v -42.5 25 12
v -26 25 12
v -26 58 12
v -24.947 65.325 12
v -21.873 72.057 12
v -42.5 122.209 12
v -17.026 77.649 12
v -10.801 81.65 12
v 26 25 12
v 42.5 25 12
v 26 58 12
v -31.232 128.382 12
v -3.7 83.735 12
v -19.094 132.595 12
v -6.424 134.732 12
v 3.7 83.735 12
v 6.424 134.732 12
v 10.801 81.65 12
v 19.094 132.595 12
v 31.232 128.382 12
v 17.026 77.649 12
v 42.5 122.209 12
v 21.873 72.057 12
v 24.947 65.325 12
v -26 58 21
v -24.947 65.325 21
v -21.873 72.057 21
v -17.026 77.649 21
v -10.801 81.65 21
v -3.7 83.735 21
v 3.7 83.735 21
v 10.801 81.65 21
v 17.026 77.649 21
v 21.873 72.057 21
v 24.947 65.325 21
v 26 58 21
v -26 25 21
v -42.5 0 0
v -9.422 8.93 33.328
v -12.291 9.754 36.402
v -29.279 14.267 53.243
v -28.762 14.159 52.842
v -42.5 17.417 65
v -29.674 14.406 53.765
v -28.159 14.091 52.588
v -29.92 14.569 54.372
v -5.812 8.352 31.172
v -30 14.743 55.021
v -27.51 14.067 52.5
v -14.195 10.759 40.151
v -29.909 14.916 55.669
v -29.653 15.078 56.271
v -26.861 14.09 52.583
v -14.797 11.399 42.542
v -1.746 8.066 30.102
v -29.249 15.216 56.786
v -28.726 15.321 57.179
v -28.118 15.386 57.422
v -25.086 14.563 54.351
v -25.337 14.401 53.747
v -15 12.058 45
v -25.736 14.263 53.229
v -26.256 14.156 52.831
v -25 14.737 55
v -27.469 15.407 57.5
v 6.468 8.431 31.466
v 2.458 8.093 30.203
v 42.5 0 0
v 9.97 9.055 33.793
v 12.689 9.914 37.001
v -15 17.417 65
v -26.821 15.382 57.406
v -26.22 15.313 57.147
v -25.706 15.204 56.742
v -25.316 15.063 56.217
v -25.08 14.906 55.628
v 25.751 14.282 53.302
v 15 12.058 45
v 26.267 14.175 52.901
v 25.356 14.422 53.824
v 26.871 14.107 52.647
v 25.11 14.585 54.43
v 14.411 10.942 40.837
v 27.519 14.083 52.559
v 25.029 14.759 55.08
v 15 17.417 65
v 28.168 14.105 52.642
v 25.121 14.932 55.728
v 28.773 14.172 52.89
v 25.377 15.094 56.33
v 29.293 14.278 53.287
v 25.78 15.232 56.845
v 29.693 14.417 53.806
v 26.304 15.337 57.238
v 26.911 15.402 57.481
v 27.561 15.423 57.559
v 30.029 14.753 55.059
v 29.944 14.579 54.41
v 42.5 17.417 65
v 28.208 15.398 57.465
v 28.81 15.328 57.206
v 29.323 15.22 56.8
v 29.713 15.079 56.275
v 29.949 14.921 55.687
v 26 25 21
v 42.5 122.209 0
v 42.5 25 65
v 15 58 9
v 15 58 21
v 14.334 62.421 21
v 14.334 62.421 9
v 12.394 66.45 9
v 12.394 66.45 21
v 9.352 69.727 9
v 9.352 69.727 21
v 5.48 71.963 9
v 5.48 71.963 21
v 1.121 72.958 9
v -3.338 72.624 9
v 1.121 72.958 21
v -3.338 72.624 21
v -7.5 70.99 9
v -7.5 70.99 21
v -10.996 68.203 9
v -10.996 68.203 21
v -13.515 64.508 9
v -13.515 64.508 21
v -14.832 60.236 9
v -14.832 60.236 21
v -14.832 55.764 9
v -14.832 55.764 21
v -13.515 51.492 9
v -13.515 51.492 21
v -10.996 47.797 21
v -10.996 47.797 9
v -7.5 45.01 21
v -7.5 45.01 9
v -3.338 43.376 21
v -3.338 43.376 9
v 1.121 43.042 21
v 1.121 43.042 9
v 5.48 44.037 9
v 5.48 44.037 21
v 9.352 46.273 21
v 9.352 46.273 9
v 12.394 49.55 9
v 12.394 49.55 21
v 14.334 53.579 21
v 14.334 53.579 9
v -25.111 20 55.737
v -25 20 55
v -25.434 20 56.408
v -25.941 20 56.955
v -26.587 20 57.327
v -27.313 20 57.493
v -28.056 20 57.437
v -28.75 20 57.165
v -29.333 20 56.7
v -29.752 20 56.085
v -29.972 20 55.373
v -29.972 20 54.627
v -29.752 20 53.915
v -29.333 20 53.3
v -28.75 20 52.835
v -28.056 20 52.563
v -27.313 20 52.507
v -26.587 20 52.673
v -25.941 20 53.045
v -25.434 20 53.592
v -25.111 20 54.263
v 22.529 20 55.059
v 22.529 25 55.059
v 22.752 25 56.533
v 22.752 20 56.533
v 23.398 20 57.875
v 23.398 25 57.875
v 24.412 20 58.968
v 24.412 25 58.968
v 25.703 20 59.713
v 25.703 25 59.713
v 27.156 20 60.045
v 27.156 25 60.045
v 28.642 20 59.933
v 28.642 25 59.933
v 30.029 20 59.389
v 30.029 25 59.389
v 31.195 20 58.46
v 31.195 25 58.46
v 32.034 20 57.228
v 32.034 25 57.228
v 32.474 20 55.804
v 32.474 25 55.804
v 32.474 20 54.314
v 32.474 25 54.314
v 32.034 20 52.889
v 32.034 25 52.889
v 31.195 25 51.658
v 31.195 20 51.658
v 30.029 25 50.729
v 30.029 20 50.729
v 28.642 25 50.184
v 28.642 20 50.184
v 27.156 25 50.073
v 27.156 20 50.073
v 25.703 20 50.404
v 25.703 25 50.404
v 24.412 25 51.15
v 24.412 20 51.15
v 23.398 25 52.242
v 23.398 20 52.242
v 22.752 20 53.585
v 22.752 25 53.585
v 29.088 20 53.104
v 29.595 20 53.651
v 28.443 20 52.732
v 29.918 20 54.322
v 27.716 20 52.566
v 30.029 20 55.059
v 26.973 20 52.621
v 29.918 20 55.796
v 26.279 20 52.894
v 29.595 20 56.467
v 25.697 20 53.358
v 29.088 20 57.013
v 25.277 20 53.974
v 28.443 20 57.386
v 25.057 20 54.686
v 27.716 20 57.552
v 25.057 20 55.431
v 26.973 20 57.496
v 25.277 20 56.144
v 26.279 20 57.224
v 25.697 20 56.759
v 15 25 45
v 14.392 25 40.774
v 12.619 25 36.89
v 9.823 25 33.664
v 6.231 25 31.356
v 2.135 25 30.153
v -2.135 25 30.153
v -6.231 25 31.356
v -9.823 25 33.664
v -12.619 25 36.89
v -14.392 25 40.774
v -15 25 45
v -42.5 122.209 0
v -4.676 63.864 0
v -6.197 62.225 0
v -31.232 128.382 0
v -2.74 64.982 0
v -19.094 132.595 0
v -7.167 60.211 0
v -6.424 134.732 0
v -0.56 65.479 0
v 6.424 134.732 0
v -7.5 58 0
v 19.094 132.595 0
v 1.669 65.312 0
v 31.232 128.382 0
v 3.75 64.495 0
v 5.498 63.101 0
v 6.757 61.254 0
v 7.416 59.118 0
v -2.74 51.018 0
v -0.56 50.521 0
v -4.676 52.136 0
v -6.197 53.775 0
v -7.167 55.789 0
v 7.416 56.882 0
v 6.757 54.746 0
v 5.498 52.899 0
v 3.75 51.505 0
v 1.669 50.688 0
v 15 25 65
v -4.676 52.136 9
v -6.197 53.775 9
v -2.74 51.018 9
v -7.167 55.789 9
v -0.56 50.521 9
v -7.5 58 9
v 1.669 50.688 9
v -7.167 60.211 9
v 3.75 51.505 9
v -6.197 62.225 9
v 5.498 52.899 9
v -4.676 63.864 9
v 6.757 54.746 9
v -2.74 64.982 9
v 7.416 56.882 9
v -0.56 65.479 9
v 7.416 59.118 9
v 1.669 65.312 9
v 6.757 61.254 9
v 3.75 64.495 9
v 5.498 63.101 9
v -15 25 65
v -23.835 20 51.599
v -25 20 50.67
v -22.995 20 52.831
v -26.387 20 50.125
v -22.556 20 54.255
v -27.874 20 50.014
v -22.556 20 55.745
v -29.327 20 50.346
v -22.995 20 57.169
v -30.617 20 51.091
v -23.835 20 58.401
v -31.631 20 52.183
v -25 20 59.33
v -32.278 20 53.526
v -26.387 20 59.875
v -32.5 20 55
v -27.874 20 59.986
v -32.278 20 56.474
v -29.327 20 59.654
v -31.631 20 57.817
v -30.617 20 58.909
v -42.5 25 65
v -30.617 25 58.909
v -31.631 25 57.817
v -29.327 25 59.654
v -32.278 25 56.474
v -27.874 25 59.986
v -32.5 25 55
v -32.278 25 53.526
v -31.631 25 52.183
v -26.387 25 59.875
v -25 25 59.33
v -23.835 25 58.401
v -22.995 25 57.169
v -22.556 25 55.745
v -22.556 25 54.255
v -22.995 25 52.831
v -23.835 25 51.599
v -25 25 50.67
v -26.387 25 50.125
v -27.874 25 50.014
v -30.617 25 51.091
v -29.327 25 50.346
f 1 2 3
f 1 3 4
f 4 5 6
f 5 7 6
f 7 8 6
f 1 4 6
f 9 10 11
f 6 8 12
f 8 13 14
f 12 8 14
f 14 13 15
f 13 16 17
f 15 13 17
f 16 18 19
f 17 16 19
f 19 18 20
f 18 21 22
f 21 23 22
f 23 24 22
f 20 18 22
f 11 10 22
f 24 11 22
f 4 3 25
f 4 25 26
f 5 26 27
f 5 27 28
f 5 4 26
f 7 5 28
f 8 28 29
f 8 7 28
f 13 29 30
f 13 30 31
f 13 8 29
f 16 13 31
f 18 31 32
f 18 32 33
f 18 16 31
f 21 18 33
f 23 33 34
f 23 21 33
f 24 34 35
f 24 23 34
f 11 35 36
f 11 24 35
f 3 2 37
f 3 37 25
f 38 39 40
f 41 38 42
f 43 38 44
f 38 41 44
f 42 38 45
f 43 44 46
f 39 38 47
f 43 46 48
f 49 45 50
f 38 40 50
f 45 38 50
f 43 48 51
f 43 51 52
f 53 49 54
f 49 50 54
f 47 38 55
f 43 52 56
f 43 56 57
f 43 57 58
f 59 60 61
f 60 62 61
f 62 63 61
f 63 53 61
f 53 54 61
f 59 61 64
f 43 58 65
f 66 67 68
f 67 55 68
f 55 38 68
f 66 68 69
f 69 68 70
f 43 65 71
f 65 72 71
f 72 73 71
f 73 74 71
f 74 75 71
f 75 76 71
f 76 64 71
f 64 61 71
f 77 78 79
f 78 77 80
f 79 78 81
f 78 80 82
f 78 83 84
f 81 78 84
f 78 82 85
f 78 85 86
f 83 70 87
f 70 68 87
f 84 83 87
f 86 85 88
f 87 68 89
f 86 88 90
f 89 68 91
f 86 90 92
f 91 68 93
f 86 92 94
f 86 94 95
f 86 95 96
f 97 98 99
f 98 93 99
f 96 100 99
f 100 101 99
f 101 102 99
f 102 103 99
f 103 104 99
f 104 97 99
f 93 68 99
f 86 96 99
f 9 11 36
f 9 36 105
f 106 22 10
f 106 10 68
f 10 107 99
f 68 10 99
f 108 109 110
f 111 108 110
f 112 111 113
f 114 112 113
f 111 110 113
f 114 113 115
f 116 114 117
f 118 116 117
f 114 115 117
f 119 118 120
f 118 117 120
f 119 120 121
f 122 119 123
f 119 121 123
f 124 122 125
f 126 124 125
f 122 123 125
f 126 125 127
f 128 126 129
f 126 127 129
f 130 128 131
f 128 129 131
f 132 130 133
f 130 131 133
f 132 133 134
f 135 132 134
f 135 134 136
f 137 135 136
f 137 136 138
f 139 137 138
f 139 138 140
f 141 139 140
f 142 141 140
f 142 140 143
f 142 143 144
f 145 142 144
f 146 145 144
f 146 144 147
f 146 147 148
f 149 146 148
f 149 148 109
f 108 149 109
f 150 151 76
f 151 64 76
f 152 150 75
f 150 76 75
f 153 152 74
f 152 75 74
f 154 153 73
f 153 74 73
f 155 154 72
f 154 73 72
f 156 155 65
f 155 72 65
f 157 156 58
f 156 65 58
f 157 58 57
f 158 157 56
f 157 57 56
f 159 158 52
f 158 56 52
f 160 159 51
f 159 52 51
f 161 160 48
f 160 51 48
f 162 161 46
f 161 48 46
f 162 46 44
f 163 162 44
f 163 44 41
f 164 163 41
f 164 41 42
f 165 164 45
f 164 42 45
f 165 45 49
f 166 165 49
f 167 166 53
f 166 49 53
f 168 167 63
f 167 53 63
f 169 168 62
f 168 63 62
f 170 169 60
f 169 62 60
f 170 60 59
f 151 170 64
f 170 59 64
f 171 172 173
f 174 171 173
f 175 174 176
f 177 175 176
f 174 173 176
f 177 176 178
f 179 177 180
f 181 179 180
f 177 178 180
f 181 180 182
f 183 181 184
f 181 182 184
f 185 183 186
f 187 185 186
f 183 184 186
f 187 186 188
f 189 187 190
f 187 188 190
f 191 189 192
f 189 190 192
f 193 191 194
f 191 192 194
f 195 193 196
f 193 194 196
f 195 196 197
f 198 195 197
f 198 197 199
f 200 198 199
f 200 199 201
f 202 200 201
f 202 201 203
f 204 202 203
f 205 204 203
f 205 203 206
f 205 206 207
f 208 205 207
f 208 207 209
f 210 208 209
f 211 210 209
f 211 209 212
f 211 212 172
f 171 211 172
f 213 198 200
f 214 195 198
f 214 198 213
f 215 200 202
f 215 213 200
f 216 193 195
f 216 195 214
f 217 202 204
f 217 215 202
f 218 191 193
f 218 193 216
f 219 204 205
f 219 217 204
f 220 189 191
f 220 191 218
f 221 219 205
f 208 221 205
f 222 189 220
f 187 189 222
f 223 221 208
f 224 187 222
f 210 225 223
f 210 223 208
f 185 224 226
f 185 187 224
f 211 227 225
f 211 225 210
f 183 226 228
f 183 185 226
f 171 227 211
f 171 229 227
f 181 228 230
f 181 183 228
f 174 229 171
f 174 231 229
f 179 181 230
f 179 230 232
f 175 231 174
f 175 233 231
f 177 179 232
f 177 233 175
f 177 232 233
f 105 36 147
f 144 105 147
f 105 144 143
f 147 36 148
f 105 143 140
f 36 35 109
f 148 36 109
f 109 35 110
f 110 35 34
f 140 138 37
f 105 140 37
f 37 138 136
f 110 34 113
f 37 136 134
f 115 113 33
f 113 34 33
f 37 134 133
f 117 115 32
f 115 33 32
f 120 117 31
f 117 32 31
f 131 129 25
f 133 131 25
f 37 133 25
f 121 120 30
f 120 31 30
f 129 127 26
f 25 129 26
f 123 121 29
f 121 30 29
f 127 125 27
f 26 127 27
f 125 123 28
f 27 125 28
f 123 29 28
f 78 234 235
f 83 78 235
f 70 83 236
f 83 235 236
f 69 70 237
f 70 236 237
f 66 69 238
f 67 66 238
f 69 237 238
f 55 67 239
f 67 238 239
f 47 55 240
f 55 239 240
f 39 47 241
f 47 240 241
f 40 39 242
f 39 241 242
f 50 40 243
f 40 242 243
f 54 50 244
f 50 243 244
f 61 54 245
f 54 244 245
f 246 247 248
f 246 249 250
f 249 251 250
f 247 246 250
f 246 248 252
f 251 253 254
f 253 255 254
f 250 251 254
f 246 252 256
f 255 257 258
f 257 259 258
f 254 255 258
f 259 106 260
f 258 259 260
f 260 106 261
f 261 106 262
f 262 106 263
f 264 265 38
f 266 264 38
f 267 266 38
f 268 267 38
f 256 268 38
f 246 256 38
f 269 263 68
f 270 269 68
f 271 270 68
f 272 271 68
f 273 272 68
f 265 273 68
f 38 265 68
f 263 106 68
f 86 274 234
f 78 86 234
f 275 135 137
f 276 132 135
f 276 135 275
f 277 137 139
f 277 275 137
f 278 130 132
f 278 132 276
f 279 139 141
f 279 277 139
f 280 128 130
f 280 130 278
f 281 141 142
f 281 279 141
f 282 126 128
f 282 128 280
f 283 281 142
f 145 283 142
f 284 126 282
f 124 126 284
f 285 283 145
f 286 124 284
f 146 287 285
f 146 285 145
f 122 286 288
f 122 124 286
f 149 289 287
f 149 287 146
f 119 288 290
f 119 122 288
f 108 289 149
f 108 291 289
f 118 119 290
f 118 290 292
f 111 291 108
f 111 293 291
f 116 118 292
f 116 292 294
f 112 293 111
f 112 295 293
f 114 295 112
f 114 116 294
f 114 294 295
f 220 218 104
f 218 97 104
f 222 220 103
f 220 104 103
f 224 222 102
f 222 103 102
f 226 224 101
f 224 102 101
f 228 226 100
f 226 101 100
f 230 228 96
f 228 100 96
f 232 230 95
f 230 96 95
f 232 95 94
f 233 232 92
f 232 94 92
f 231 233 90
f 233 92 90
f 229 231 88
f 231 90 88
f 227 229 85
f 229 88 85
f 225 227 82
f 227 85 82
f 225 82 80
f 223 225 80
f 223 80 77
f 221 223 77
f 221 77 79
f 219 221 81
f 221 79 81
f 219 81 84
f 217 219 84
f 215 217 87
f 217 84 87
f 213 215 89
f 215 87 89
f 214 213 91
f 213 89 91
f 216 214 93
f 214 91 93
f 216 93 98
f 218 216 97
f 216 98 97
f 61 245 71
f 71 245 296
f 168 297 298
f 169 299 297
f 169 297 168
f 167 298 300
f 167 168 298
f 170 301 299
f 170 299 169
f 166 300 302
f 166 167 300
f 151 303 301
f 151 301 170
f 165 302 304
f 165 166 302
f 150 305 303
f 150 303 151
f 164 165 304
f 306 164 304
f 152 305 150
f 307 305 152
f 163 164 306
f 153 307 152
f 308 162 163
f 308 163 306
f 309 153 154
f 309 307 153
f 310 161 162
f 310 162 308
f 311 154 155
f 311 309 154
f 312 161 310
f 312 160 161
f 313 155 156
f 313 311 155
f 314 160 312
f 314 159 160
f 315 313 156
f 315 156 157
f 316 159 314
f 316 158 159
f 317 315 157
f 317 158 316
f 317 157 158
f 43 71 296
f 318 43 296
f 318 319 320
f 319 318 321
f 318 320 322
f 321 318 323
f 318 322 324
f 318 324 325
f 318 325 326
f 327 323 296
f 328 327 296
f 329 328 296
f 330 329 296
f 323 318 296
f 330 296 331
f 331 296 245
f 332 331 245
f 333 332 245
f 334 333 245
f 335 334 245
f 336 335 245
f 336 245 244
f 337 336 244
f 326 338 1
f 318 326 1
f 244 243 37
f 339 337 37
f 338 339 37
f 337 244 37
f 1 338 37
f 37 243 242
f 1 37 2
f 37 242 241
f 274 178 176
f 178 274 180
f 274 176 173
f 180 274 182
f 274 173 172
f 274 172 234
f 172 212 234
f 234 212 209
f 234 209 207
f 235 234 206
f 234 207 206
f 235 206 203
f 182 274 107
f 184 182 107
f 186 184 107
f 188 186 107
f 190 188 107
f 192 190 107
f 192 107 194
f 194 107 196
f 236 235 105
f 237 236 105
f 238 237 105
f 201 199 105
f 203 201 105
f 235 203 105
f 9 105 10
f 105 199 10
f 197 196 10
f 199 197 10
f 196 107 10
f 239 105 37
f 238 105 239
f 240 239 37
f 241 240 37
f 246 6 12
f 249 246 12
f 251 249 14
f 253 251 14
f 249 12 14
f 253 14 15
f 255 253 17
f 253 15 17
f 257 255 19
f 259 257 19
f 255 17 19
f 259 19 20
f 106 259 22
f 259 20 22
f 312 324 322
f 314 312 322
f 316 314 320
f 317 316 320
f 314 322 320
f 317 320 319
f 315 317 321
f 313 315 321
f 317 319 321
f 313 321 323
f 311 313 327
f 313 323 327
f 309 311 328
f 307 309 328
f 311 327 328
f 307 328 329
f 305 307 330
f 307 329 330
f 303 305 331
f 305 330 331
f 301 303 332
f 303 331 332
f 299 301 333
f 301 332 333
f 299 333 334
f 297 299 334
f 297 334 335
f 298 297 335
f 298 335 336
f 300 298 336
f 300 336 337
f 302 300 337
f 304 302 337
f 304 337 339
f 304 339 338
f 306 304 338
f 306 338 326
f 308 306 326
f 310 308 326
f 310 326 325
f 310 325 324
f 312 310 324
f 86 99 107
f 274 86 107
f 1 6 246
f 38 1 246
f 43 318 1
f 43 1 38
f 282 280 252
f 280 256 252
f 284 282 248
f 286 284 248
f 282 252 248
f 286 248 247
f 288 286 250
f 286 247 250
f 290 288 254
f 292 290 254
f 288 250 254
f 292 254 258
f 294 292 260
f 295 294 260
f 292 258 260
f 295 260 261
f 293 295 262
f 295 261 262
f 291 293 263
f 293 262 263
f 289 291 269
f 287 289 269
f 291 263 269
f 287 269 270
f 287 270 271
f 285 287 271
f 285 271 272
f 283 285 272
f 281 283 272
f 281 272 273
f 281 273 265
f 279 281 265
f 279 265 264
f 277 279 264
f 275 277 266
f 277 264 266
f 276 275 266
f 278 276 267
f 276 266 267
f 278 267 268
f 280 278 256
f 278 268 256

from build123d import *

# Parameters (mm, degrees)
BOSS_EXTRUDE1_DEPTH                      = 42.5
CUT_EXTRUDE1_DEPTH                       = 54
CUT_EXTRUDE1_DEPTH_BACK                  = 13
BOSS_EXTRUDE2_DEPTH                      = 9
CBORE_FOR_M10_HEX_HEAD_BOLT1_D           = 15
CBORE_FOR_M10_HEX_HEAD_BOLT1_CBORE_D     = 30
CBORE_FOR_M10_HEX_HEAD_BOLT1_CBORE_DEPTH = 12
CUT_EXTRUDE2_DEPTH                       = 111
CUT_EXTRUDE2_DEPTH_BACK                  = 26
CBORE_FOR_M10_HEX_HEAD_BOLT2_D           = 5
CBORE_FOR_M10_HEX_HEAD_BOLT2_CBORE_D     = 10
CBORE_FOR_M10_HEX_HEAD_BOLT2_CBORE_DEPTH = 5


with BuildPart() as part:
    # Sketch1 → Boss-Extrude1 (new body, symmetric)
    with BuildSketch(Plane.YZ):
        Polygon((0, 0), (17.416697508, 65), (25, 65), (25, 12), (135, 12), (135, 0), align=None)
    extrude(amount=BOSS_EXTRUDE1_DEPTH, both=True)

    # Sketch3 → Cut-Extrude1 (cut, two sides)
    with BuildSketch(Plane.XY.offset(12)) as cut_extrude1_sk:
        with BuildLine():
            Line((-299.10474982, -47.63923197), (-42.5, 122.208644278))
            ThreePointArc((-42.5, 122.208644278), (0, 135), (42.5, 122.208644278))
            Line((42.5, 122.208644278), (299.10474982, -47.63923197))
            Line((299.10474982, -47.63923197), (299.10474982, 567.80954314))
            Line((299.10474982, 567.80954314), (-299.10474982, 567.80954314))
            Line((-299.10474982, 567.80954314), (-299.10474982, -47.63923197))
        make_face()
    extrude(amount=CUT_EXTRUDE1_DEPTH, mode=Mode.SUBTRACT)
    extrude(cut_extrude1_sk.sketch, amount=-CUT_EXTRUDE1_DEPTH_BACK, mode=Mode.SUBTRACT)

    # Sketch4 → Boss-Extrude2 (add)
    with BuildSketch(Plane.XY.offset(12)):
        with BuildLine():
            Line((-26, 25), (-26, 58))
            ThreePointArc((-26, 58), (0, 84), (26, 58))
            Line((26, 58), (26, 25))
            Line((26, 25), (-26, 25))
        make_face()
    extrude(amount=BOSS_EXTRUDE2_DEPTH)

    # CBORE for M10 Hex Head Bolt1 (through all)
    with Locations(Plane(origin=(0, 58, 21), x_dir=(1, 0, 0), z_dir=(0, 0, 1))):
        with Locations((0, 0)):
            CounterBoreHole(CBORE_FOR_M10_HEX_HEAD_BOLT1_D / 2, CBORE_FOR_M10_HEX_HEAD_BOLT1_CBORE_D / 2, CBORE_FOR_M10_HEX_HEAD_BOLT1_CBORE_DEPTH)

    # Sketch8 → Cut-Extrude2 (cut, two sides)
    with BuildSketch(Plane(origin=(0, 25, 0), x_dir=(-1, 0, 0), z_dir=(0, 1, 0))) as cut_extrude2_sk:
        with BuildLine():
            Line((-15, 65), (-15, 45))
            ThreePointArc((-15, 45), (0, 30), (15, 45))
            Line((15, 45), (15, 65))
            Line((15, 65), (-15, 65))
        make_face()
    extrude(amount=CUT_EXTRUDE2_DEPTH, mode=Mode.SUBTRACT)
    extrude(cut_extrude2_sk.sketch, amount=-CUT_EXTRUDE2_DEPTH_BACK, mode=Mode.SUBTRACT)

    # CBORE for M10 Hex Head Bolt2 (through all)
    with Locations(Plane(origin=(0, 25, 0), x_dir=(-1, 0, 0), z_dir=(0, 1, 0))):
        with Locations((0, 60), (27.5, 55), (0.084967263, 59.81697493), (-27.529393087, 55.058808224)):
            CounterBoreHole(CBORE_FOR_M10_HEX_HEAD_BOLT2_D / 2, CBORE_FOR_M10_HEX_HEAD_BOLT2_CBORE_D / 2, CBORE_FOR_M10_HEX_HEAD_BOLT2_CBORE_DEPTH)


solid = part.part
